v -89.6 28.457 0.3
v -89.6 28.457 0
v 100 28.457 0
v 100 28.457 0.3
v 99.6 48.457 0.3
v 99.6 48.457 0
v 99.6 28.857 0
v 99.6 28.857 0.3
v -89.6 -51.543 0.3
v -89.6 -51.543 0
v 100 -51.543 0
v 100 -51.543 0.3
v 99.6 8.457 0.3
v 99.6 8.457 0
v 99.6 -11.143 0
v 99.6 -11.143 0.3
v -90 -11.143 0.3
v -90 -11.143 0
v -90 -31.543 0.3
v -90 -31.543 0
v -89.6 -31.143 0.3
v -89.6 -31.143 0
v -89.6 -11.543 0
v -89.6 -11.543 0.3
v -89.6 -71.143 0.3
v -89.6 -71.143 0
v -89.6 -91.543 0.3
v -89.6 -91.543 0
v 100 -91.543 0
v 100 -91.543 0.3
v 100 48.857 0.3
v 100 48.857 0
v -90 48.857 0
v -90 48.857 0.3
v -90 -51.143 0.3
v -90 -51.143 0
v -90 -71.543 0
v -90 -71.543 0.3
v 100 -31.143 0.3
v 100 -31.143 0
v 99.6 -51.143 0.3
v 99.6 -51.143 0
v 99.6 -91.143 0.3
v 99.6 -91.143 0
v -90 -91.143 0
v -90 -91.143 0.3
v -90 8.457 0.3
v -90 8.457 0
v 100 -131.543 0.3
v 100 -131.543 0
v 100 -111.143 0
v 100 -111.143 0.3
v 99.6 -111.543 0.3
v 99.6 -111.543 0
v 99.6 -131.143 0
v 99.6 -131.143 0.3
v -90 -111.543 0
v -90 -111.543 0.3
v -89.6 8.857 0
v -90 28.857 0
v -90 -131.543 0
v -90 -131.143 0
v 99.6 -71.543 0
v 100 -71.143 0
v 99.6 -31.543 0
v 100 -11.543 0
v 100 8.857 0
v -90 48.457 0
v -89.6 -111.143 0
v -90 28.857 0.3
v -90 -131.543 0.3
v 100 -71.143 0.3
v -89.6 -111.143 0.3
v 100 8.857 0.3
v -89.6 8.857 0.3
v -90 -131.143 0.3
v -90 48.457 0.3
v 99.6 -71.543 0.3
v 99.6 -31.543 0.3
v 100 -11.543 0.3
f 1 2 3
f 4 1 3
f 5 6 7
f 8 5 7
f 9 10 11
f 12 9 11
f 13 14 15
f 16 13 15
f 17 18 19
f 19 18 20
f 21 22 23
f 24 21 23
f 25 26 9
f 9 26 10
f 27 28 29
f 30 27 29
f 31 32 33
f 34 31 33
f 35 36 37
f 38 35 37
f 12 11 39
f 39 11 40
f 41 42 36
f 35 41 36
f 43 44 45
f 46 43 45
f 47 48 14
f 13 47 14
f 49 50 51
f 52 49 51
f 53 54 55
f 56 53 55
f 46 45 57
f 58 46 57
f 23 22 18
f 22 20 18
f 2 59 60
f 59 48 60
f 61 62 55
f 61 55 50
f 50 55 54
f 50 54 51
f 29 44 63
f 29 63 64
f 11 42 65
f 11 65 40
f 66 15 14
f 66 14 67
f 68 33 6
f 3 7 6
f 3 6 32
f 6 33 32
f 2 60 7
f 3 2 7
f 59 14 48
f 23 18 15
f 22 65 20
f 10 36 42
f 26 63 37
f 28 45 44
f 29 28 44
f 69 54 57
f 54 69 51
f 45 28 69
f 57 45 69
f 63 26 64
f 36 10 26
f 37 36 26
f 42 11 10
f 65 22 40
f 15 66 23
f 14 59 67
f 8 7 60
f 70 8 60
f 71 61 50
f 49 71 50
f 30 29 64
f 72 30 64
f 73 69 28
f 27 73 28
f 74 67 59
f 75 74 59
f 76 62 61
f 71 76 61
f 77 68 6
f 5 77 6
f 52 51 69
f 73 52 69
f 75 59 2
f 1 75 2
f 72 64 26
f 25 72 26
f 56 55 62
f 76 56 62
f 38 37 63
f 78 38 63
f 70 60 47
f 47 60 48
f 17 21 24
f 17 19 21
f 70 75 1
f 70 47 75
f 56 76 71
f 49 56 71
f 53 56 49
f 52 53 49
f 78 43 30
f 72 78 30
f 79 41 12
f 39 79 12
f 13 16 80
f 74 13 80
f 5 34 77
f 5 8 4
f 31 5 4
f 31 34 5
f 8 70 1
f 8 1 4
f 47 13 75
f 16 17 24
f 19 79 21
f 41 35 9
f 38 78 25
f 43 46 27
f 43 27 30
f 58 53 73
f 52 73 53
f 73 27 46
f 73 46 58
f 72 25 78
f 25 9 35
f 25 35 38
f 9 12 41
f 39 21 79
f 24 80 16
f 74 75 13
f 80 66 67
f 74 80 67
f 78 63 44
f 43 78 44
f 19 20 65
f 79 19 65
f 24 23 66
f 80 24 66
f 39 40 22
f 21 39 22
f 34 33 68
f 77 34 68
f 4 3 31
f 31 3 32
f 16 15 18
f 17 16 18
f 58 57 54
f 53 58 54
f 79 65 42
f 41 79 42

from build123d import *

# Parameters (mm, degrees)
F1_DEPTH = 0.3


with BuildPart() as f1:
    # F0 (on Top) → F1 (new body)
    with BuildSketch(Plane.XY):
        Polygon((100, 48.856538), (-90, 48.856538), (-90, 48.456538), (99.6, 48.456538), (99.6, 28.856538), (-90, 28.856538), (-90, 28.456538), (-90, 8.856538), (-90, 8.456538), (99.6, 8.456538), (99.6, -11.143462), (-90, -11.143462), (-90, -11.543462), (-90, -31.143462), (-90, -31.543462), (99.6, -31.543462), (99.6, -51.143462), (-90, -51.143462), (-90, -51.543462), (-90, -71.143462), (-90, -71.543462), (99.6, -71.543462), (99.6, -91.143462), (-90, -91.143462), (-90, -91.543462), (-90, -111.143462), (-89.6, -111.143462), (-89.6, -91.543462), (100, -91.543462), (100, -71.543462), (100, -71.143462), (-89.6, -71.143462), (-89.6, -51.543462), (100, -51.543462), (100, -31.543462), (100, -31.143462), (-89.6, -31.143462), (-89.6, -11.543462), (100, -11.543462), (100, 8.456538), (100, 8.856538), (-89.6, 8.856538), (-89.6, 28.456538), (100, 28.456538), (100, 48.456538), align=None)
        Polygon((100, -111.143462), (-89.6, -111.143462), (-90, -111.143462), (-90, -111.543462), (99.6, -111.543462), (99.6, -131.143462), (-90, -131.143462), (-90, -131.543462), (-89.6, -131.543462), (100, -131.543462), (100, -111.543462), align=None)
    extrude(amount=F1_DEPTH)


solid = f1.part
